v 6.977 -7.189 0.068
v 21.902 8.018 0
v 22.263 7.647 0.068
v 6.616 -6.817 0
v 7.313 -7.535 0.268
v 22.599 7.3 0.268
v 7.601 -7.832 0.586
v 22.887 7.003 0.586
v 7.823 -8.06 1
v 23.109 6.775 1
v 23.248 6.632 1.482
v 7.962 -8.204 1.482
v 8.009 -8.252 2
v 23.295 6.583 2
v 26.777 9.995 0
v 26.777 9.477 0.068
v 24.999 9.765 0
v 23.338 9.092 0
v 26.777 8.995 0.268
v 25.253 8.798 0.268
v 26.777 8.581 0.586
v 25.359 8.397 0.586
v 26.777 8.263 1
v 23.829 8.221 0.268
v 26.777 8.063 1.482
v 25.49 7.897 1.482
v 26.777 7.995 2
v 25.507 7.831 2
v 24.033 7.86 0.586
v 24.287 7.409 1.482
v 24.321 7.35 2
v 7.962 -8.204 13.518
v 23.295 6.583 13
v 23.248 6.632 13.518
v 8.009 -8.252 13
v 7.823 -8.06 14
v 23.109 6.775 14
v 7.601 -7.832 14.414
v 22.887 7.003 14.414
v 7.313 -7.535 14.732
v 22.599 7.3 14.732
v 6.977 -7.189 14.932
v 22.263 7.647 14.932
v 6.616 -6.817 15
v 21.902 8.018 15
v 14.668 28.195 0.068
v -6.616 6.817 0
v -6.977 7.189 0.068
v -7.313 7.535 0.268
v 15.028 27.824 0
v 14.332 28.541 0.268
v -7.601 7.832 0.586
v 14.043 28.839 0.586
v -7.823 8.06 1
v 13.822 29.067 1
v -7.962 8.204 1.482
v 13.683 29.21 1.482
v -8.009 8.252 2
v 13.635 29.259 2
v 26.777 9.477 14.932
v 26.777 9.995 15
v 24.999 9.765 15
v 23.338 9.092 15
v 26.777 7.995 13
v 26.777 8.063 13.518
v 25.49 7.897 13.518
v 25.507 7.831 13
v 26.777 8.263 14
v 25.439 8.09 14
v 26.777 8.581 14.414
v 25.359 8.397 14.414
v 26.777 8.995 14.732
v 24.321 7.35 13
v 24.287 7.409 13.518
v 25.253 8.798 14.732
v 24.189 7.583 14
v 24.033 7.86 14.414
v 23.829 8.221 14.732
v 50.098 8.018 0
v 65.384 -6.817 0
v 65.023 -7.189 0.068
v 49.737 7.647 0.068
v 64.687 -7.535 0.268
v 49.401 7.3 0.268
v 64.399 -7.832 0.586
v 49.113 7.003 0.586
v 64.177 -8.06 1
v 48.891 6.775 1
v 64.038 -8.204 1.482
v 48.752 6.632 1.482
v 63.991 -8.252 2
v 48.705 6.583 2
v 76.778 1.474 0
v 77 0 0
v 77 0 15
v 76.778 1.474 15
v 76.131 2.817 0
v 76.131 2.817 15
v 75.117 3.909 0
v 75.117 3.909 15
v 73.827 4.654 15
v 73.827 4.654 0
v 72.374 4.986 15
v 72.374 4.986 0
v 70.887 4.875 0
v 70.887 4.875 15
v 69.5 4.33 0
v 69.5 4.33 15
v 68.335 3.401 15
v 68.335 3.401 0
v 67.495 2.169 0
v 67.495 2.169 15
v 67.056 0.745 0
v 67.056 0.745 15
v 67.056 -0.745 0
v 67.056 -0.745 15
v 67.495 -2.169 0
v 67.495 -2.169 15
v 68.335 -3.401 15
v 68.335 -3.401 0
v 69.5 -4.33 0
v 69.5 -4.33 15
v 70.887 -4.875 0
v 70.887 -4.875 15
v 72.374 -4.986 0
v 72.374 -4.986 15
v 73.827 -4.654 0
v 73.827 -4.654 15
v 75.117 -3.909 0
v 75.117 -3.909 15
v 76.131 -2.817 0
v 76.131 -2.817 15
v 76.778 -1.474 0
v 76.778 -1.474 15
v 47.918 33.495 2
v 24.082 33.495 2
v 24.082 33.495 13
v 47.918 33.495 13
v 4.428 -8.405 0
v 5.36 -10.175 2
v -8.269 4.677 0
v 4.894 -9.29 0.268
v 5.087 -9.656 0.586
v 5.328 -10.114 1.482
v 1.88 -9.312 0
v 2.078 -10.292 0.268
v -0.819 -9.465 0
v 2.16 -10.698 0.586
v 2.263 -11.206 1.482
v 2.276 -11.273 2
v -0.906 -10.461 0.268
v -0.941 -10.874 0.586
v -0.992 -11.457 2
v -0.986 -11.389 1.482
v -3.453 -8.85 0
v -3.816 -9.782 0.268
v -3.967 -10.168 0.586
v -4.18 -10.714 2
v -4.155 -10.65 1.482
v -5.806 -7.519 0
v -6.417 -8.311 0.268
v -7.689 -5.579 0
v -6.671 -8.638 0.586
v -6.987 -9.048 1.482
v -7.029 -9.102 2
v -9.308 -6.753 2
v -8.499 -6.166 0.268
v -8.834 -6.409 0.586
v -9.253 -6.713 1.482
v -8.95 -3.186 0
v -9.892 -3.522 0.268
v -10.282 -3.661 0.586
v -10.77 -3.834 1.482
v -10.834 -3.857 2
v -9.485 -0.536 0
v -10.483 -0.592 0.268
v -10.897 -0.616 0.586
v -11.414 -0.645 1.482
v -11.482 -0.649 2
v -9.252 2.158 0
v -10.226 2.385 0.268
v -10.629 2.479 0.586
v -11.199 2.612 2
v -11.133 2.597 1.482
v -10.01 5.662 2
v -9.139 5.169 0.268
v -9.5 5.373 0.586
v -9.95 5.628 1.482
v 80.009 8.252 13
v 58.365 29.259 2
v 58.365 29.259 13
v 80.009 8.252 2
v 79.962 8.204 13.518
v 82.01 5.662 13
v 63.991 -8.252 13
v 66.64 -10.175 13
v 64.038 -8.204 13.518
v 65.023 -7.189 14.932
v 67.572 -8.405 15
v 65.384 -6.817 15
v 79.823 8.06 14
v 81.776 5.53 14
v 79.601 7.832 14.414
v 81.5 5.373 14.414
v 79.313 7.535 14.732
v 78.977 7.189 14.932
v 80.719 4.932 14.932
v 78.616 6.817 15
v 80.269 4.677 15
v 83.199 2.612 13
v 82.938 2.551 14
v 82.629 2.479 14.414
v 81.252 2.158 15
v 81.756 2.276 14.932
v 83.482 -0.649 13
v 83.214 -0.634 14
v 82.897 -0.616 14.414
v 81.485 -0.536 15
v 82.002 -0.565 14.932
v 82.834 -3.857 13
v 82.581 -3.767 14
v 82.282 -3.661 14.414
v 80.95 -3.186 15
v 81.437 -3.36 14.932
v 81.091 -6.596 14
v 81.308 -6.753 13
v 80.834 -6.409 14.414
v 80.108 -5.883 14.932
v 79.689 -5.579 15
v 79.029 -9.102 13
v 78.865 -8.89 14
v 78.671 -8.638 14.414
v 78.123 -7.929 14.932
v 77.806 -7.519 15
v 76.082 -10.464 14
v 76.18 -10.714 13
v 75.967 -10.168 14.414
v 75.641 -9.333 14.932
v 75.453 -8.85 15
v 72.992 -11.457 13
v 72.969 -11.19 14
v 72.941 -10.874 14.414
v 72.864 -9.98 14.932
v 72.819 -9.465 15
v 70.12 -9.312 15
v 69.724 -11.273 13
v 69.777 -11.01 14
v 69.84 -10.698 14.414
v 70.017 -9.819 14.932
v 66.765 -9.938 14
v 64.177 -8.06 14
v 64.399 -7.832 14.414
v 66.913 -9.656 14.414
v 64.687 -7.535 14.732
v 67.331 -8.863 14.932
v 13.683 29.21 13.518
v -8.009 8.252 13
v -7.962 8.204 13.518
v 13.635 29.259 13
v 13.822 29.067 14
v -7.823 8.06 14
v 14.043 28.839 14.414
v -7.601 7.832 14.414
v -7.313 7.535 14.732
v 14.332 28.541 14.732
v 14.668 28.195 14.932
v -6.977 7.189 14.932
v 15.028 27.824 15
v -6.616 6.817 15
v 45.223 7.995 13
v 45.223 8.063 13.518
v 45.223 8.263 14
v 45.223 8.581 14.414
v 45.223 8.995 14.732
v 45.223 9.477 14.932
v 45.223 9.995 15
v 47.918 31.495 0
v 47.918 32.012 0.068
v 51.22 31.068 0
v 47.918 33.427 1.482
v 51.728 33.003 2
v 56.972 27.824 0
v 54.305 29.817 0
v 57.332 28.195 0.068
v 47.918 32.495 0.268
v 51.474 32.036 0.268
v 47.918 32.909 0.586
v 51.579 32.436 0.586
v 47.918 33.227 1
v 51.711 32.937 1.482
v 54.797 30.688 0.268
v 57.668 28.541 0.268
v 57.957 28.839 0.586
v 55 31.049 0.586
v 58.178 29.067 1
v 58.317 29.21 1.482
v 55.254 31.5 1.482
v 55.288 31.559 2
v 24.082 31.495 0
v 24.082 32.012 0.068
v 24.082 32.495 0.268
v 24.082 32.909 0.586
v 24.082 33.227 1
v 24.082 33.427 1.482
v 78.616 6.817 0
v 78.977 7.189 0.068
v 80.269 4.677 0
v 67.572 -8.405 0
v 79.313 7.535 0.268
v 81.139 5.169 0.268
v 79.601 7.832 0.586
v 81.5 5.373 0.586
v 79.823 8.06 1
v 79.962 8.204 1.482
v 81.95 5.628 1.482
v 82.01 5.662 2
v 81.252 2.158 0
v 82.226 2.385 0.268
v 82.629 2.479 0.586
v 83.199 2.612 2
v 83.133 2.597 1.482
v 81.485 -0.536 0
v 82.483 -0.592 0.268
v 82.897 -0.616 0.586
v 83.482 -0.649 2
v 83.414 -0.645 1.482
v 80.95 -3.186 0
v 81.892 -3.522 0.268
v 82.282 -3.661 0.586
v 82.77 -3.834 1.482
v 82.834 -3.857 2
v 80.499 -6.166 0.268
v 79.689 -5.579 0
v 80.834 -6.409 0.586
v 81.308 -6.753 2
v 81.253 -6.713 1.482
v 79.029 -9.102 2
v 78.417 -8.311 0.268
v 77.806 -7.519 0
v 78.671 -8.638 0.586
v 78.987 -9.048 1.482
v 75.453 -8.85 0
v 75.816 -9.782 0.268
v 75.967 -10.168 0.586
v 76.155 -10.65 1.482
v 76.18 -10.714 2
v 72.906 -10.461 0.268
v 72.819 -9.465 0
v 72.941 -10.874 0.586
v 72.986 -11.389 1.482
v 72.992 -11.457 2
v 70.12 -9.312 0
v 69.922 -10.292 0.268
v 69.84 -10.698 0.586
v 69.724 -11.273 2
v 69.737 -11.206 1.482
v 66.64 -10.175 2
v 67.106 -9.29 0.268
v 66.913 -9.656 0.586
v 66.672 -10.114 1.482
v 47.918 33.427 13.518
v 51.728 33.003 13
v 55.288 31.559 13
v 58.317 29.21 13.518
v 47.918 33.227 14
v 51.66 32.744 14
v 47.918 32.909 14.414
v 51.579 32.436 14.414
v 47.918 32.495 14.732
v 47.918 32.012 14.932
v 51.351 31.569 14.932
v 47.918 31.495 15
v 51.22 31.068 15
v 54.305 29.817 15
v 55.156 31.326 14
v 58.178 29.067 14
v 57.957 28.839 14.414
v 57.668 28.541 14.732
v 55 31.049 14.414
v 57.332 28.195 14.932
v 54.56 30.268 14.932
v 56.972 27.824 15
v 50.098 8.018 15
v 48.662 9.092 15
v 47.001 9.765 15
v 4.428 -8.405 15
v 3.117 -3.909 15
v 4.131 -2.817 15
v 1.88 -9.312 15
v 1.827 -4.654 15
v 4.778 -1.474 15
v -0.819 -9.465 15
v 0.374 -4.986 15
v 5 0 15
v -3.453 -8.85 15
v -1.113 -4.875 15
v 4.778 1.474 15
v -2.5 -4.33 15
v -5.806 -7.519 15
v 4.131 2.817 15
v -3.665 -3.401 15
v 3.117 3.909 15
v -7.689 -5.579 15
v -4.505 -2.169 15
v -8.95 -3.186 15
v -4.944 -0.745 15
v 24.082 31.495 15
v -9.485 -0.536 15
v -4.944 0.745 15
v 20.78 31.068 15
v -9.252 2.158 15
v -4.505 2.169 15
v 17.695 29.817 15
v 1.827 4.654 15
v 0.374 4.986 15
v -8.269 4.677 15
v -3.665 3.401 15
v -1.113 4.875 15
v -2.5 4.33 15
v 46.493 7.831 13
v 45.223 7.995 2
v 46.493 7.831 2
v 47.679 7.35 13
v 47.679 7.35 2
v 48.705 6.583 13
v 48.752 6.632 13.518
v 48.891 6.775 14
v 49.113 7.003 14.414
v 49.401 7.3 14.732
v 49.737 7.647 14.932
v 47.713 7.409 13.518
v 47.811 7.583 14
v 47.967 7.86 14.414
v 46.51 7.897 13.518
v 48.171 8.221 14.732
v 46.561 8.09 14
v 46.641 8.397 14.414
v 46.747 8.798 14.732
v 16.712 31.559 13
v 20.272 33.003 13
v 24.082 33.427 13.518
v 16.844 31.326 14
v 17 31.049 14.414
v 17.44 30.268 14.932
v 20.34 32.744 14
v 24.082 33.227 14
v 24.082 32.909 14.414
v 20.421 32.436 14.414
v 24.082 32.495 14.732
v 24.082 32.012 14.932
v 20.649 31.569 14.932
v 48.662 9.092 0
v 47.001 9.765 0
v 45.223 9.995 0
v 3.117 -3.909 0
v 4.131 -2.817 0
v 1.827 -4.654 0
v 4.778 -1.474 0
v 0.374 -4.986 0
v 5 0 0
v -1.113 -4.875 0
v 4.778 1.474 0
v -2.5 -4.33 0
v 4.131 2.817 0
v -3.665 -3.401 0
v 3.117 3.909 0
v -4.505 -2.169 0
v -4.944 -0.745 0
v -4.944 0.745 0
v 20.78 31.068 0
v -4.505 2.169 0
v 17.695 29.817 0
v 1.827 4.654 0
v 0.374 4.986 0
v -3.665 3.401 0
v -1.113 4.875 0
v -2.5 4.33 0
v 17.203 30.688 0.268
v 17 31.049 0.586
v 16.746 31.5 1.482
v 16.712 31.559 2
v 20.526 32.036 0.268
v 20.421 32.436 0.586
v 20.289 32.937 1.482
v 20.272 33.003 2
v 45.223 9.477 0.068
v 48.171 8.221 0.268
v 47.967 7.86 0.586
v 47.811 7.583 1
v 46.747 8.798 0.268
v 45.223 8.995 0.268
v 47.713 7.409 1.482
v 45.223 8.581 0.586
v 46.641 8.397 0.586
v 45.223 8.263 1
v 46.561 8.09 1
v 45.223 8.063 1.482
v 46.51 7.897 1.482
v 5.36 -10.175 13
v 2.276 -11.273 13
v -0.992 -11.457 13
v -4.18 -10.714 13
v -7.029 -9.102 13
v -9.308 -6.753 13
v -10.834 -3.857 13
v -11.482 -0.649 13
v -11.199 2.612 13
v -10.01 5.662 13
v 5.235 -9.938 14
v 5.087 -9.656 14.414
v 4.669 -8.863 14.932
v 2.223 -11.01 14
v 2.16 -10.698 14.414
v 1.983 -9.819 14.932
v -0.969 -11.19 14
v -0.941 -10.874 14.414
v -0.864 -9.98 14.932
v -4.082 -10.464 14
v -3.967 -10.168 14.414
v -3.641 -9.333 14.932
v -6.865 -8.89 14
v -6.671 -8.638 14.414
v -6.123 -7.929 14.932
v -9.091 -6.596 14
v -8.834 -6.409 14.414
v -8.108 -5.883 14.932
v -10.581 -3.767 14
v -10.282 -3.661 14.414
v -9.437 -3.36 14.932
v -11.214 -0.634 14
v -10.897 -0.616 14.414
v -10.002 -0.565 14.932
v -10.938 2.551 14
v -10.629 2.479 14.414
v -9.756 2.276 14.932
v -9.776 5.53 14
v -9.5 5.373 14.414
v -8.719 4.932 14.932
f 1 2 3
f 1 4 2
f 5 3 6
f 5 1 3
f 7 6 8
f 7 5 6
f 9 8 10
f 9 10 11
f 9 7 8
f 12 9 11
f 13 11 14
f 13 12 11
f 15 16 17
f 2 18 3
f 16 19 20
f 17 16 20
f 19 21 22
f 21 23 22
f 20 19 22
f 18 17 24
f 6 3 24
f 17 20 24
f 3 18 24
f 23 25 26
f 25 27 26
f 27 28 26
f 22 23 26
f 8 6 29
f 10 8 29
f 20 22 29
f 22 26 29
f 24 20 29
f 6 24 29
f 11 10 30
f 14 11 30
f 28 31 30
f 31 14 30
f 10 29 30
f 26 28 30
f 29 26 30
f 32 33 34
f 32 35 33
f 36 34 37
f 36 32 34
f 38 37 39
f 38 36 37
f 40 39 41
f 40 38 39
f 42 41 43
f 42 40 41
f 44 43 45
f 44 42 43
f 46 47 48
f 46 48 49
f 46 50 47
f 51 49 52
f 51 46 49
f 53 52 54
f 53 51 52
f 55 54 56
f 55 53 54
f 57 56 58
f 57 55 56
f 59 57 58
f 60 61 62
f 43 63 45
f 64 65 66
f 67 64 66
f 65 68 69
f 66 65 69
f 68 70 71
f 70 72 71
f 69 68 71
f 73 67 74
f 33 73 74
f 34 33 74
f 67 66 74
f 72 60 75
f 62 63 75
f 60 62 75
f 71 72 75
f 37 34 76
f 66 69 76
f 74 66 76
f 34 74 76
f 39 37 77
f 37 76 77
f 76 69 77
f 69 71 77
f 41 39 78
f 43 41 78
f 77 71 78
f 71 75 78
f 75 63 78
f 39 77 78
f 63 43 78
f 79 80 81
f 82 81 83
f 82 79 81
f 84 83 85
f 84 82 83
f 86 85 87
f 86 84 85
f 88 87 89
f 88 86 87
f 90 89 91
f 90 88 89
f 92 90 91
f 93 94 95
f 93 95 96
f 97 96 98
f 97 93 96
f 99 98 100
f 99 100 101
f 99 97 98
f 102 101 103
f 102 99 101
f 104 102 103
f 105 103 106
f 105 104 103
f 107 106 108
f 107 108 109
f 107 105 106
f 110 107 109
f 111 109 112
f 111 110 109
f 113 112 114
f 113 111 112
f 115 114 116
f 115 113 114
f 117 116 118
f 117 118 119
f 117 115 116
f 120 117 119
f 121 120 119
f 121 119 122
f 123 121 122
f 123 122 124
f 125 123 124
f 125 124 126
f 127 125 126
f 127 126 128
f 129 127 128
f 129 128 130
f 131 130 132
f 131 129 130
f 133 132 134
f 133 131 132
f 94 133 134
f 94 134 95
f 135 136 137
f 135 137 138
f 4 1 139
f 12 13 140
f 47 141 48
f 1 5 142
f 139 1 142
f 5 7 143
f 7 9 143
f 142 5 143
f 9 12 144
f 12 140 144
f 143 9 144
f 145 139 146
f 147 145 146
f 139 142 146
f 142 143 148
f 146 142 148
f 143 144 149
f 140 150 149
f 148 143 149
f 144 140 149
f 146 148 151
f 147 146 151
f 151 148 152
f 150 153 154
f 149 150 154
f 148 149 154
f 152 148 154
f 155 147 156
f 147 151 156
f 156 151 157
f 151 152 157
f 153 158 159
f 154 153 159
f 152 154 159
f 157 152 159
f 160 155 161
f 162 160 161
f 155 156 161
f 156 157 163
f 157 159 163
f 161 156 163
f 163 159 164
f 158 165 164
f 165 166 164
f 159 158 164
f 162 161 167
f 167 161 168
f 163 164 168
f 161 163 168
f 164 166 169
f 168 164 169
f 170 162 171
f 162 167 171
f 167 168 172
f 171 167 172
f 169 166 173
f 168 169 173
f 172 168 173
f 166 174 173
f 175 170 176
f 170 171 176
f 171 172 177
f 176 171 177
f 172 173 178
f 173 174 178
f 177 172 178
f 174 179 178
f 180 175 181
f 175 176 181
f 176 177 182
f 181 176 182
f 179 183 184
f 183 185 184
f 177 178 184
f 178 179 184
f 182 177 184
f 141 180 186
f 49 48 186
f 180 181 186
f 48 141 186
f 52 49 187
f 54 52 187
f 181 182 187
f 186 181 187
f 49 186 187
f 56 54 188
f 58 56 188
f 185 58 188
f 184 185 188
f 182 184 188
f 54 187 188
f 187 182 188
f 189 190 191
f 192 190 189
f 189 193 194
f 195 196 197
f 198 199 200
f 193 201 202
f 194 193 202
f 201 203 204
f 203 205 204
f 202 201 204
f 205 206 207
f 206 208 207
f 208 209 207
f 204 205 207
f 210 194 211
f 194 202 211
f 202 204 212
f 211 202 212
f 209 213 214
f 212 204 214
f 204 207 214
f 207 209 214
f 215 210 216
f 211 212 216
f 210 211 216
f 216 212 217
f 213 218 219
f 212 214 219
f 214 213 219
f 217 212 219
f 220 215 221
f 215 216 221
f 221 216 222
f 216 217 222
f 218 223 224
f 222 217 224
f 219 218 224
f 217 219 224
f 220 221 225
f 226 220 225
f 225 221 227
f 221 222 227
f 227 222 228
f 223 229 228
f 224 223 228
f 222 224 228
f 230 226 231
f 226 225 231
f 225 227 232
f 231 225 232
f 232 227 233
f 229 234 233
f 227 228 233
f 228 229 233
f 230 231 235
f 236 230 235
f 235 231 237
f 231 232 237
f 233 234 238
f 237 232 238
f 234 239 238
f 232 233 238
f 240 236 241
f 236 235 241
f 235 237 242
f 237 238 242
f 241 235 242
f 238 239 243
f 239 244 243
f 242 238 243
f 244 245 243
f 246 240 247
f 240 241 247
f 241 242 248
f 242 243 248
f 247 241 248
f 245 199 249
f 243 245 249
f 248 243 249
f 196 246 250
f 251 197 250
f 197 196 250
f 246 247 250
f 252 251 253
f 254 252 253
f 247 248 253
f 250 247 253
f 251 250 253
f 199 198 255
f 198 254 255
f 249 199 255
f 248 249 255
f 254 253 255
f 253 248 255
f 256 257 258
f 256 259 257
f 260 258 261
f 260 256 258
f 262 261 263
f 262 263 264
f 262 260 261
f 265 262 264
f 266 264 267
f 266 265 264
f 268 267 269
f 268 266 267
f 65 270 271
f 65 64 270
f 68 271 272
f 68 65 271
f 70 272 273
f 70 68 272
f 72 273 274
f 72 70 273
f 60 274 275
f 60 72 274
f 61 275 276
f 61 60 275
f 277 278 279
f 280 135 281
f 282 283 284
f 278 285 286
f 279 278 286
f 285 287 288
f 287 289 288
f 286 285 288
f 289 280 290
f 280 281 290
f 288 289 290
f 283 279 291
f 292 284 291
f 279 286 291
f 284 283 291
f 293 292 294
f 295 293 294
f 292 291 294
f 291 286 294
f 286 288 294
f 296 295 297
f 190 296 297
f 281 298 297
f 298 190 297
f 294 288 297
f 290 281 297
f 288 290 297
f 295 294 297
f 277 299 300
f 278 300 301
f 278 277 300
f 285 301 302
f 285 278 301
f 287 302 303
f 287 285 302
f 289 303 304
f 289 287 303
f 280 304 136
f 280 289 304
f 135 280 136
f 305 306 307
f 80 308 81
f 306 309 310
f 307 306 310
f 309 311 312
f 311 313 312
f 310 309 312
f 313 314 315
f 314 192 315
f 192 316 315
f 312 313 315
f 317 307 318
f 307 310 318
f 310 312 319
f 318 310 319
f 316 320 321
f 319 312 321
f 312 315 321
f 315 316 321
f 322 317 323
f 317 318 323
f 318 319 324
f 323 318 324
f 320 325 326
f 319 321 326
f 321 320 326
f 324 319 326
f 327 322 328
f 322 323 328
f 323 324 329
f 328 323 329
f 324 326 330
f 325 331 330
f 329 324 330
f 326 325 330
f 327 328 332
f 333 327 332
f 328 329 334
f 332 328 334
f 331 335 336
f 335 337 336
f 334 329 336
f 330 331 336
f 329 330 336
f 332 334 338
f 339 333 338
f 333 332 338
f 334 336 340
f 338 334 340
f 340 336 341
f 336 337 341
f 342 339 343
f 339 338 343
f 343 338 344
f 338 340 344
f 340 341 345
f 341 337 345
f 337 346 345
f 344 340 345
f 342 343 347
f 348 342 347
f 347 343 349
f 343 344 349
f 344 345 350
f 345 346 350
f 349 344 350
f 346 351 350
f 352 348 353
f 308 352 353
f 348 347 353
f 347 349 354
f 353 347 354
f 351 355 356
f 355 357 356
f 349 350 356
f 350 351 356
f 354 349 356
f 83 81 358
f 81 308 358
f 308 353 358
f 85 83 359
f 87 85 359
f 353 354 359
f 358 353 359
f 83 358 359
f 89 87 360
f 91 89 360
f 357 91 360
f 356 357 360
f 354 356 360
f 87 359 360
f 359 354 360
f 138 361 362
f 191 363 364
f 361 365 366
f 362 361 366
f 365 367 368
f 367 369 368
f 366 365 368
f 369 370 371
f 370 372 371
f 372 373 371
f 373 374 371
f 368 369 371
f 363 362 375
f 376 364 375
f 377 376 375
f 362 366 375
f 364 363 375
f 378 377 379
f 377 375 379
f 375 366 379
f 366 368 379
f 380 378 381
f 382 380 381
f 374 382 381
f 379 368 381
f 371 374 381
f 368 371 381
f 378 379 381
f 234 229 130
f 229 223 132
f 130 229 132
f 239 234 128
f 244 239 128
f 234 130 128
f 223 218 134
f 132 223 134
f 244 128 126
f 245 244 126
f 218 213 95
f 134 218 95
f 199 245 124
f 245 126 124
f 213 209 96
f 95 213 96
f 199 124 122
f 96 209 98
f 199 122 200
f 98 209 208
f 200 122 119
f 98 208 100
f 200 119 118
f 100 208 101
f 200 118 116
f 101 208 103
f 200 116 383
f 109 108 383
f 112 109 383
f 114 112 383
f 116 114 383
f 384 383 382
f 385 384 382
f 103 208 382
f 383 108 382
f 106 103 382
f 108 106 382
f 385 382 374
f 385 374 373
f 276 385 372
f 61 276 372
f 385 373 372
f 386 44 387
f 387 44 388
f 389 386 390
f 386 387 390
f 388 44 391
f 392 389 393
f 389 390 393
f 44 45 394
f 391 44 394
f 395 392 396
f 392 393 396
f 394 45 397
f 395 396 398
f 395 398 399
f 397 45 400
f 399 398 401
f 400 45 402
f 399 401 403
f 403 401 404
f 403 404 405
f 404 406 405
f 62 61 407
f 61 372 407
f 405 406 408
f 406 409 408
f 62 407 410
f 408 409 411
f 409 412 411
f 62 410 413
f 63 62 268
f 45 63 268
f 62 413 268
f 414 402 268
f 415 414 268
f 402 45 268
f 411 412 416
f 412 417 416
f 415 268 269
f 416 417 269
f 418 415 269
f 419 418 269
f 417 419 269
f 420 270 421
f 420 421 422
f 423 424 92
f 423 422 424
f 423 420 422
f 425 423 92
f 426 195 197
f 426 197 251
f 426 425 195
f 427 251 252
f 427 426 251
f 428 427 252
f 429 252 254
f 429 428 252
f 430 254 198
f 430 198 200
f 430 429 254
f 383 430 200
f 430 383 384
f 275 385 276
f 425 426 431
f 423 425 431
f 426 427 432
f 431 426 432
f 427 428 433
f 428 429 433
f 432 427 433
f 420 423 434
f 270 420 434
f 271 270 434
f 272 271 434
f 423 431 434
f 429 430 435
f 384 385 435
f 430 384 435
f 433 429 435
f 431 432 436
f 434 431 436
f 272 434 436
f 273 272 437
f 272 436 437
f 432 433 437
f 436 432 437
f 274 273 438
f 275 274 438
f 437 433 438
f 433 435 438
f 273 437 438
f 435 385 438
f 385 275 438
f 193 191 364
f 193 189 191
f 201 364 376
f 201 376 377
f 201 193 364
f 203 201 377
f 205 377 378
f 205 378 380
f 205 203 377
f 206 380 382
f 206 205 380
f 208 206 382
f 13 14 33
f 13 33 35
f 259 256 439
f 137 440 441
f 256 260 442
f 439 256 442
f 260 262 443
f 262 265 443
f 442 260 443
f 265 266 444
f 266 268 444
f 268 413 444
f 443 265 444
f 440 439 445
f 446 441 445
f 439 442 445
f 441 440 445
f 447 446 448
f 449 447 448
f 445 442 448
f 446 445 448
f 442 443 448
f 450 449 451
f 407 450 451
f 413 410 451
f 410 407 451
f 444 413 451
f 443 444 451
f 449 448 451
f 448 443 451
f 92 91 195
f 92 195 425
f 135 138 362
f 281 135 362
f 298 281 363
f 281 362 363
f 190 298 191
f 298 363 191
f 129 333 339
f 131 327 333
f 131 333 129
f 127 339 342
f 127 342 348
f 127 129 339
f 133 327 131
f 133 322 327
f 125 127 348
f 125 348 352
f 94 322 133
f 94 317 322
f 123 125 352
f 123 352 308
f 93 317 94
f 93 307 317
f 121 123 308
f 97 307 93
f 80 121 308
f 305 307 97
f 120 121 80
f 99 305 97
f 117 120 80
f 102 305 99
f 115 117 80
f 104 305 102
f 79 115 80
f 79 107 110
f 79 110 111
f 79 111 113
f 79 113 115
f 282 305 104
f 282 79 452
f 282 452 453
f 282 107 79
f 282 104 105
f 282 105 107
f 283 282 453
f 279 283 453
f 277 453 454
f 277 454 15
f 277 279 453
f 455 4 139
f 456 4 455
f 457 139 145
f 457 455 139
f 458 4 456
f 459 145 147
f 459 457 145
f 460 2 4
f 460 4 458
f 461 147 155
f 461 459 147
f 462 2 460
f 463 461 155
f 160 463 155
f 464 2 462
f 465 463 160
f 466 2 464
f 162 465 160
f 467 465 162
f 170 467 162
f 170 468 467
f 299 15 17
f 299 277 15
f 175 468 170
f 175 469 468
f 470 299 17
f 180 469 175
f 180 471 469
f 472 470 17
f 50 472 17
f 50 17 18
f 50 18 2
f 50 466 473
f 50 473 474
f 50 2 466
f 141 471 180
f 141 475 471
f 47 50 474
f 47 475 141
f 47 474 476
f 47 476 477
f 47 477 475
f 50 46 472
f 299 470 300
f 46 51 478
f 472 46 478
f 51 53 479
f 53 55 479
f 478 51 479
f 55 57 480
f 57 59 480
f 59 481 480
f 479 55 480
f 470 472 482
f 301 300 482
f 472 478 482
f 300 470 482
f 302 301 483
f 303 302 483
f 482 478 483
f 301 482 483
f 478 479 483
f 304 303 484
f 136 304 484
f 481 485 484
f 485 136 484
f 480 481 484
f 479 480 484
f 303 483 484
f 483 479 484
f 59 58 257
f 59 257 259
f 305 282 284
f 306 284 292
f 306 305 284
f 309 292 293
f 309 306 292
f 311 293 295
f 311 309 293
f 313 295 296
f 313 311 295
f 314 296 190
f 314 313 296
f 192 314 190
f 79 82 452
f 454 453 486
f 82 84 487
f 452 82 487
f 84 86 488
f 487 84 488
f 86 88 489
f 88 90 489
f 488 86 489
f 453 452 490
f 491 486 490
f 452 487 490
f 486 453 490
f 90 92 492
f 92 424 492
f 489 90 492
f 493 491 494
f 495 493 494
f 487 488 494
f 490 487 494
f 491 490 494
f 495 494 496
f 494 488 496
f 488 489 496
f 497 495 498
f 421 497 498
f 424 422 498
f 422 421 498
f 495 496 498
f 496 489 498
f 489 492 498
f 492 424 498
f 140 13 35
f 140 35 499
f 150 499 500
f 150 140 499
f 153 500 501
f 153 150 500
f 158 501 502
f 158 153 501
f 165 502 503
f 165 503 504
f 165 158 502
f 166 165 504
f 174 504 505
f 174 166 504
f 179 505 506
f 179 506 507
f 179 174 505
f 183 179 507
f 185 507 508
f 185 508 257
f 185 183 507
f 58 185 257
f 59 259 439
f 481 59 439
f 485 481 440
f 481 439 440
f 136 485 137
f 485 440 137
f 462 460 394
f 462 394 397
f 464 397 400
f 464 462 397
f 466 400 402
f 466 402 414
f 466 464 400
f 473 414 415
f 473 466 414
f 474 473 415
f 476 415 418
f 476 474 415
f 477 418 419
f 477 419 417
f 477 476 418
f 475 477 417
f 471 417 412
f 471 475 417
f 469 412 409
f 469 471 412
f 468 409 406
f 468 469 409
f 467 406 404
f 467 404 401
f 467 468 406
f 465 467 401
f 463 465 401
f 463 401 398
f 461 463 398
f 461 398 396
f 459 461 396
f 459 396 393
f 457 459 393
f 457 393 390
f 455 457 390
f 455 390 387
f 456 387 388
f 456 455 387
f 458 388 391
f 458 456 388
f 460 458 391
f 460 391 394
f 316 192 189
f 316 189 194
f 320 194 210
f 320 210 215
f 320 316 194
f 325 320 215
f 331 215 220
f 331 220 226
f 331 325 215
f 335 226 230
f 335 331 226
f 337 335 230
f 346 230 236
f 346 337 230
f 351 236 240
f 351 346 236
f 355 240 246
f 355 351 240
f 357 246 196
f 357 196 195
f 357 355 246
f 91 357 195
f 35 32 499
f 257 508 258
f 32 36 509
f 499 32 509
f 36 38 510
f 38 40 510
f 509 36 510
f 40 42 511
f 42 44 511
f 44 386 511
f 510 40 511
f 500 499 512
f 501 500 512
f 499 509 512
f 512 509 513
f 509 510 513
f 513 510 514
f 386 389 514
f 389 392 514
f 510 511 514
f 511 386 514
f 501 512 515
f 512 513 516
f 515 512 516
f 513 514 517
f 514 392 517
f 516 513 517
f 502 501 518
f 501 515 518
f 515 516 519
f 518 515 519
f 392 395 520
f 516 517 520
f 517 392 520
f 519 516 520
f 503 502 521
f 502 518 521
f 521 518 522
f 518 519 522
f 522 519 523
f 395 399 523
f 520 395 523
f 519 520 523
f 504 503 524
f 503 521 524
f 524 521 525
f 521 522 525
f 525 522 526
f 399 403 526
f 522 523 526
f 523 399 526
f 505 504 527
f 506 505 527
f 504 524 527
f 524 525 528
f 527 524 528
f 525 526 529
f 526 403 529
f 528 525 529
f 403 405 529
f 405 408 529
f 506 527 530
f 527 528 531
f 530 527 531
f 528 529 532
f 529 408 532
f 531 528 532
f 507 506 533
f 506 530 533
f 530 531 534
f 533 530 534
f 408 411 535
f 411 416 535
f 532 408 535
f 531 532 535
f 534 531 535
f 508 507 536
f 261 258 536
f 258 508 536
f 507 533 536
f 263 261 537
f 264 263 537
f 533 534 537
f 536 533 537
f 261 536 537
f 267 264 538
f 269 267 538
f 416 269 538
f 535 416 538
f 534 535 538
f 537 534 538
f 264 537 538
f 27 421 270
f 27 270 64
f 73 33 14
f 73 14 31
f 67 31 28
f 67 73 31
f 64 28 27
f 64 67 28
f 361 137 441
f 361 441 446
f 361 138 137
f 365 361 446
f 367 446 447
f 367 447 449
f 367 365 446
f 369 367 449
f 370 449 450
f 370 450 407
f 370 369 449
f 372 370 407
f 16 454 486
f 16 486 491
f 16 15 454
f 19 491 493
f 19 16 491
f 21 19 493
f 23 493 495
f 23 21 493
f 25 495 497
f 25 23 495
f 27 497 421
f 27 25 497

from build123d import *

# Parameters (mm, degrees)
BASE_EXTRUDE_DEPTH = 15
HOLE1_OUTLINE_R    = 5
HOLE1_DEPTH        = 15
HOLE2_OUTLINE_R    = 5
HOLE2_DEPTH        = 15
FILLET1_R          = 15
FILLET2_R          = 5
FILLET3_R          = 2


# Read off the part's stored shape, not the designer's step: Hole1, Hole2
with BuildPart() as part:
    # Sketch1 → Base-Extrude (new body)
    with BuildSketch(Plane.XY):
        with BuildLine():
            Line((-8.009157876, 8.252477817), (18, 33.494769435))
            Line((18, 33.494769435), (54, 33.494769435))
            Line((54, 33.494769435), (80.009157876, 8.252477817))
            ThreePointArc((80.009157876, 8.252477817), (80.252477817, -8.009157876), (63.990842124, -8.252477817))
            Line((63.990842124, -8.252477817), (47.25, 7.994769435))
            Line((47.25, 7.994769435), (24.75, 7.994769435))
            Line((24.75, 7.994769435), (8.009157876, -8.252477817))
            ThreePointArc((8.009157876, -8.252477817), (-8.252477817, -8.009157876), (-8.009157876, 8.252477817))
        make_face()
    extrude(amount=BASE_EXTRUDE_DEPTH)

    # Hole1 outline → Hole1 (cut)
    with BuildSketch(Plane.XY):
        Circle(HOLE1_OUTLINE_R)
    extrude(amount=HOLE1_DEPTH, mode=Mode.SUBTRACT)

    # Hole2 outline → Hole2 (cut)
    with BuildSketch(Plane.XY):
        with Locations((72, 0)):
            Circle(HOLE2_OUTLINE_R)
    extrude(amount=HOLE2_DEPTH, mode=Mode.SUBTRACT)

    # Fillet1
    fillet1_edges = [part.edges().sort_by_distance(p)[0] for p in [
        (18, 33.494769435, 7.5),
        (54, 33.494769435, 7.5),
    ]]
    fillet(fillet1_edges, radius=FILLET1_R)

    # Fillet2
    fillet2_edges = [part.edges().sort_by_distance(p)[0] for p in [
        (47.25, 7.994769435, 7.5),
        (24.75, 7.994769435, 7.5),
    ]]
    fillet(fillet2_edges, radius=FILLET2_R)

    # Fillet3
    fillet3_edges = [part.edges().sort_by_distance(p)[0] for p in [
        (15.652147936, -0.834837274, 0),
        (-8.252477817, -8.009157876, 0),
        (80.252477817, -8.009157876, 15),
        (2.813128058, 18.755674377, 15),
        (36, 33.494769435, 0),
        (36, 33.494769435, 15),
        (69.186871942, 18.755674377, 0),
        (18.445720917, 32.395516223, 0),
        (53.554279083, 32.395516223, 0),
        (69.186871942, 18.755674377, 15),
        (18.445720917, 32.395516223, 15),
        (53.554279083, 32.395516223, 15),
        (-8.252477817, -8.009157876, 15),
        (36, 7.994769435, 0),
        (36, 7.994769435, 15),
        (56.347852064, -0.834837274, 0),
        (56.347852064, -0.834837274, 15),
        (24.898573639, 7.628351698, 0),
        (24.898573639, 7.628351698, 15),
        (47.101426361, 7.628351698, 0),
        (47.101426361, 7.628351698, 15),
        (15.652147936, -0.834837274, 15),
        (2.813128058, 18.755674377, 0),
        (80.252477817, -8.009157876, 0),
    ]]
    fillet(fillet3_edges, radius=FILLET3_R)


solid = part.part
